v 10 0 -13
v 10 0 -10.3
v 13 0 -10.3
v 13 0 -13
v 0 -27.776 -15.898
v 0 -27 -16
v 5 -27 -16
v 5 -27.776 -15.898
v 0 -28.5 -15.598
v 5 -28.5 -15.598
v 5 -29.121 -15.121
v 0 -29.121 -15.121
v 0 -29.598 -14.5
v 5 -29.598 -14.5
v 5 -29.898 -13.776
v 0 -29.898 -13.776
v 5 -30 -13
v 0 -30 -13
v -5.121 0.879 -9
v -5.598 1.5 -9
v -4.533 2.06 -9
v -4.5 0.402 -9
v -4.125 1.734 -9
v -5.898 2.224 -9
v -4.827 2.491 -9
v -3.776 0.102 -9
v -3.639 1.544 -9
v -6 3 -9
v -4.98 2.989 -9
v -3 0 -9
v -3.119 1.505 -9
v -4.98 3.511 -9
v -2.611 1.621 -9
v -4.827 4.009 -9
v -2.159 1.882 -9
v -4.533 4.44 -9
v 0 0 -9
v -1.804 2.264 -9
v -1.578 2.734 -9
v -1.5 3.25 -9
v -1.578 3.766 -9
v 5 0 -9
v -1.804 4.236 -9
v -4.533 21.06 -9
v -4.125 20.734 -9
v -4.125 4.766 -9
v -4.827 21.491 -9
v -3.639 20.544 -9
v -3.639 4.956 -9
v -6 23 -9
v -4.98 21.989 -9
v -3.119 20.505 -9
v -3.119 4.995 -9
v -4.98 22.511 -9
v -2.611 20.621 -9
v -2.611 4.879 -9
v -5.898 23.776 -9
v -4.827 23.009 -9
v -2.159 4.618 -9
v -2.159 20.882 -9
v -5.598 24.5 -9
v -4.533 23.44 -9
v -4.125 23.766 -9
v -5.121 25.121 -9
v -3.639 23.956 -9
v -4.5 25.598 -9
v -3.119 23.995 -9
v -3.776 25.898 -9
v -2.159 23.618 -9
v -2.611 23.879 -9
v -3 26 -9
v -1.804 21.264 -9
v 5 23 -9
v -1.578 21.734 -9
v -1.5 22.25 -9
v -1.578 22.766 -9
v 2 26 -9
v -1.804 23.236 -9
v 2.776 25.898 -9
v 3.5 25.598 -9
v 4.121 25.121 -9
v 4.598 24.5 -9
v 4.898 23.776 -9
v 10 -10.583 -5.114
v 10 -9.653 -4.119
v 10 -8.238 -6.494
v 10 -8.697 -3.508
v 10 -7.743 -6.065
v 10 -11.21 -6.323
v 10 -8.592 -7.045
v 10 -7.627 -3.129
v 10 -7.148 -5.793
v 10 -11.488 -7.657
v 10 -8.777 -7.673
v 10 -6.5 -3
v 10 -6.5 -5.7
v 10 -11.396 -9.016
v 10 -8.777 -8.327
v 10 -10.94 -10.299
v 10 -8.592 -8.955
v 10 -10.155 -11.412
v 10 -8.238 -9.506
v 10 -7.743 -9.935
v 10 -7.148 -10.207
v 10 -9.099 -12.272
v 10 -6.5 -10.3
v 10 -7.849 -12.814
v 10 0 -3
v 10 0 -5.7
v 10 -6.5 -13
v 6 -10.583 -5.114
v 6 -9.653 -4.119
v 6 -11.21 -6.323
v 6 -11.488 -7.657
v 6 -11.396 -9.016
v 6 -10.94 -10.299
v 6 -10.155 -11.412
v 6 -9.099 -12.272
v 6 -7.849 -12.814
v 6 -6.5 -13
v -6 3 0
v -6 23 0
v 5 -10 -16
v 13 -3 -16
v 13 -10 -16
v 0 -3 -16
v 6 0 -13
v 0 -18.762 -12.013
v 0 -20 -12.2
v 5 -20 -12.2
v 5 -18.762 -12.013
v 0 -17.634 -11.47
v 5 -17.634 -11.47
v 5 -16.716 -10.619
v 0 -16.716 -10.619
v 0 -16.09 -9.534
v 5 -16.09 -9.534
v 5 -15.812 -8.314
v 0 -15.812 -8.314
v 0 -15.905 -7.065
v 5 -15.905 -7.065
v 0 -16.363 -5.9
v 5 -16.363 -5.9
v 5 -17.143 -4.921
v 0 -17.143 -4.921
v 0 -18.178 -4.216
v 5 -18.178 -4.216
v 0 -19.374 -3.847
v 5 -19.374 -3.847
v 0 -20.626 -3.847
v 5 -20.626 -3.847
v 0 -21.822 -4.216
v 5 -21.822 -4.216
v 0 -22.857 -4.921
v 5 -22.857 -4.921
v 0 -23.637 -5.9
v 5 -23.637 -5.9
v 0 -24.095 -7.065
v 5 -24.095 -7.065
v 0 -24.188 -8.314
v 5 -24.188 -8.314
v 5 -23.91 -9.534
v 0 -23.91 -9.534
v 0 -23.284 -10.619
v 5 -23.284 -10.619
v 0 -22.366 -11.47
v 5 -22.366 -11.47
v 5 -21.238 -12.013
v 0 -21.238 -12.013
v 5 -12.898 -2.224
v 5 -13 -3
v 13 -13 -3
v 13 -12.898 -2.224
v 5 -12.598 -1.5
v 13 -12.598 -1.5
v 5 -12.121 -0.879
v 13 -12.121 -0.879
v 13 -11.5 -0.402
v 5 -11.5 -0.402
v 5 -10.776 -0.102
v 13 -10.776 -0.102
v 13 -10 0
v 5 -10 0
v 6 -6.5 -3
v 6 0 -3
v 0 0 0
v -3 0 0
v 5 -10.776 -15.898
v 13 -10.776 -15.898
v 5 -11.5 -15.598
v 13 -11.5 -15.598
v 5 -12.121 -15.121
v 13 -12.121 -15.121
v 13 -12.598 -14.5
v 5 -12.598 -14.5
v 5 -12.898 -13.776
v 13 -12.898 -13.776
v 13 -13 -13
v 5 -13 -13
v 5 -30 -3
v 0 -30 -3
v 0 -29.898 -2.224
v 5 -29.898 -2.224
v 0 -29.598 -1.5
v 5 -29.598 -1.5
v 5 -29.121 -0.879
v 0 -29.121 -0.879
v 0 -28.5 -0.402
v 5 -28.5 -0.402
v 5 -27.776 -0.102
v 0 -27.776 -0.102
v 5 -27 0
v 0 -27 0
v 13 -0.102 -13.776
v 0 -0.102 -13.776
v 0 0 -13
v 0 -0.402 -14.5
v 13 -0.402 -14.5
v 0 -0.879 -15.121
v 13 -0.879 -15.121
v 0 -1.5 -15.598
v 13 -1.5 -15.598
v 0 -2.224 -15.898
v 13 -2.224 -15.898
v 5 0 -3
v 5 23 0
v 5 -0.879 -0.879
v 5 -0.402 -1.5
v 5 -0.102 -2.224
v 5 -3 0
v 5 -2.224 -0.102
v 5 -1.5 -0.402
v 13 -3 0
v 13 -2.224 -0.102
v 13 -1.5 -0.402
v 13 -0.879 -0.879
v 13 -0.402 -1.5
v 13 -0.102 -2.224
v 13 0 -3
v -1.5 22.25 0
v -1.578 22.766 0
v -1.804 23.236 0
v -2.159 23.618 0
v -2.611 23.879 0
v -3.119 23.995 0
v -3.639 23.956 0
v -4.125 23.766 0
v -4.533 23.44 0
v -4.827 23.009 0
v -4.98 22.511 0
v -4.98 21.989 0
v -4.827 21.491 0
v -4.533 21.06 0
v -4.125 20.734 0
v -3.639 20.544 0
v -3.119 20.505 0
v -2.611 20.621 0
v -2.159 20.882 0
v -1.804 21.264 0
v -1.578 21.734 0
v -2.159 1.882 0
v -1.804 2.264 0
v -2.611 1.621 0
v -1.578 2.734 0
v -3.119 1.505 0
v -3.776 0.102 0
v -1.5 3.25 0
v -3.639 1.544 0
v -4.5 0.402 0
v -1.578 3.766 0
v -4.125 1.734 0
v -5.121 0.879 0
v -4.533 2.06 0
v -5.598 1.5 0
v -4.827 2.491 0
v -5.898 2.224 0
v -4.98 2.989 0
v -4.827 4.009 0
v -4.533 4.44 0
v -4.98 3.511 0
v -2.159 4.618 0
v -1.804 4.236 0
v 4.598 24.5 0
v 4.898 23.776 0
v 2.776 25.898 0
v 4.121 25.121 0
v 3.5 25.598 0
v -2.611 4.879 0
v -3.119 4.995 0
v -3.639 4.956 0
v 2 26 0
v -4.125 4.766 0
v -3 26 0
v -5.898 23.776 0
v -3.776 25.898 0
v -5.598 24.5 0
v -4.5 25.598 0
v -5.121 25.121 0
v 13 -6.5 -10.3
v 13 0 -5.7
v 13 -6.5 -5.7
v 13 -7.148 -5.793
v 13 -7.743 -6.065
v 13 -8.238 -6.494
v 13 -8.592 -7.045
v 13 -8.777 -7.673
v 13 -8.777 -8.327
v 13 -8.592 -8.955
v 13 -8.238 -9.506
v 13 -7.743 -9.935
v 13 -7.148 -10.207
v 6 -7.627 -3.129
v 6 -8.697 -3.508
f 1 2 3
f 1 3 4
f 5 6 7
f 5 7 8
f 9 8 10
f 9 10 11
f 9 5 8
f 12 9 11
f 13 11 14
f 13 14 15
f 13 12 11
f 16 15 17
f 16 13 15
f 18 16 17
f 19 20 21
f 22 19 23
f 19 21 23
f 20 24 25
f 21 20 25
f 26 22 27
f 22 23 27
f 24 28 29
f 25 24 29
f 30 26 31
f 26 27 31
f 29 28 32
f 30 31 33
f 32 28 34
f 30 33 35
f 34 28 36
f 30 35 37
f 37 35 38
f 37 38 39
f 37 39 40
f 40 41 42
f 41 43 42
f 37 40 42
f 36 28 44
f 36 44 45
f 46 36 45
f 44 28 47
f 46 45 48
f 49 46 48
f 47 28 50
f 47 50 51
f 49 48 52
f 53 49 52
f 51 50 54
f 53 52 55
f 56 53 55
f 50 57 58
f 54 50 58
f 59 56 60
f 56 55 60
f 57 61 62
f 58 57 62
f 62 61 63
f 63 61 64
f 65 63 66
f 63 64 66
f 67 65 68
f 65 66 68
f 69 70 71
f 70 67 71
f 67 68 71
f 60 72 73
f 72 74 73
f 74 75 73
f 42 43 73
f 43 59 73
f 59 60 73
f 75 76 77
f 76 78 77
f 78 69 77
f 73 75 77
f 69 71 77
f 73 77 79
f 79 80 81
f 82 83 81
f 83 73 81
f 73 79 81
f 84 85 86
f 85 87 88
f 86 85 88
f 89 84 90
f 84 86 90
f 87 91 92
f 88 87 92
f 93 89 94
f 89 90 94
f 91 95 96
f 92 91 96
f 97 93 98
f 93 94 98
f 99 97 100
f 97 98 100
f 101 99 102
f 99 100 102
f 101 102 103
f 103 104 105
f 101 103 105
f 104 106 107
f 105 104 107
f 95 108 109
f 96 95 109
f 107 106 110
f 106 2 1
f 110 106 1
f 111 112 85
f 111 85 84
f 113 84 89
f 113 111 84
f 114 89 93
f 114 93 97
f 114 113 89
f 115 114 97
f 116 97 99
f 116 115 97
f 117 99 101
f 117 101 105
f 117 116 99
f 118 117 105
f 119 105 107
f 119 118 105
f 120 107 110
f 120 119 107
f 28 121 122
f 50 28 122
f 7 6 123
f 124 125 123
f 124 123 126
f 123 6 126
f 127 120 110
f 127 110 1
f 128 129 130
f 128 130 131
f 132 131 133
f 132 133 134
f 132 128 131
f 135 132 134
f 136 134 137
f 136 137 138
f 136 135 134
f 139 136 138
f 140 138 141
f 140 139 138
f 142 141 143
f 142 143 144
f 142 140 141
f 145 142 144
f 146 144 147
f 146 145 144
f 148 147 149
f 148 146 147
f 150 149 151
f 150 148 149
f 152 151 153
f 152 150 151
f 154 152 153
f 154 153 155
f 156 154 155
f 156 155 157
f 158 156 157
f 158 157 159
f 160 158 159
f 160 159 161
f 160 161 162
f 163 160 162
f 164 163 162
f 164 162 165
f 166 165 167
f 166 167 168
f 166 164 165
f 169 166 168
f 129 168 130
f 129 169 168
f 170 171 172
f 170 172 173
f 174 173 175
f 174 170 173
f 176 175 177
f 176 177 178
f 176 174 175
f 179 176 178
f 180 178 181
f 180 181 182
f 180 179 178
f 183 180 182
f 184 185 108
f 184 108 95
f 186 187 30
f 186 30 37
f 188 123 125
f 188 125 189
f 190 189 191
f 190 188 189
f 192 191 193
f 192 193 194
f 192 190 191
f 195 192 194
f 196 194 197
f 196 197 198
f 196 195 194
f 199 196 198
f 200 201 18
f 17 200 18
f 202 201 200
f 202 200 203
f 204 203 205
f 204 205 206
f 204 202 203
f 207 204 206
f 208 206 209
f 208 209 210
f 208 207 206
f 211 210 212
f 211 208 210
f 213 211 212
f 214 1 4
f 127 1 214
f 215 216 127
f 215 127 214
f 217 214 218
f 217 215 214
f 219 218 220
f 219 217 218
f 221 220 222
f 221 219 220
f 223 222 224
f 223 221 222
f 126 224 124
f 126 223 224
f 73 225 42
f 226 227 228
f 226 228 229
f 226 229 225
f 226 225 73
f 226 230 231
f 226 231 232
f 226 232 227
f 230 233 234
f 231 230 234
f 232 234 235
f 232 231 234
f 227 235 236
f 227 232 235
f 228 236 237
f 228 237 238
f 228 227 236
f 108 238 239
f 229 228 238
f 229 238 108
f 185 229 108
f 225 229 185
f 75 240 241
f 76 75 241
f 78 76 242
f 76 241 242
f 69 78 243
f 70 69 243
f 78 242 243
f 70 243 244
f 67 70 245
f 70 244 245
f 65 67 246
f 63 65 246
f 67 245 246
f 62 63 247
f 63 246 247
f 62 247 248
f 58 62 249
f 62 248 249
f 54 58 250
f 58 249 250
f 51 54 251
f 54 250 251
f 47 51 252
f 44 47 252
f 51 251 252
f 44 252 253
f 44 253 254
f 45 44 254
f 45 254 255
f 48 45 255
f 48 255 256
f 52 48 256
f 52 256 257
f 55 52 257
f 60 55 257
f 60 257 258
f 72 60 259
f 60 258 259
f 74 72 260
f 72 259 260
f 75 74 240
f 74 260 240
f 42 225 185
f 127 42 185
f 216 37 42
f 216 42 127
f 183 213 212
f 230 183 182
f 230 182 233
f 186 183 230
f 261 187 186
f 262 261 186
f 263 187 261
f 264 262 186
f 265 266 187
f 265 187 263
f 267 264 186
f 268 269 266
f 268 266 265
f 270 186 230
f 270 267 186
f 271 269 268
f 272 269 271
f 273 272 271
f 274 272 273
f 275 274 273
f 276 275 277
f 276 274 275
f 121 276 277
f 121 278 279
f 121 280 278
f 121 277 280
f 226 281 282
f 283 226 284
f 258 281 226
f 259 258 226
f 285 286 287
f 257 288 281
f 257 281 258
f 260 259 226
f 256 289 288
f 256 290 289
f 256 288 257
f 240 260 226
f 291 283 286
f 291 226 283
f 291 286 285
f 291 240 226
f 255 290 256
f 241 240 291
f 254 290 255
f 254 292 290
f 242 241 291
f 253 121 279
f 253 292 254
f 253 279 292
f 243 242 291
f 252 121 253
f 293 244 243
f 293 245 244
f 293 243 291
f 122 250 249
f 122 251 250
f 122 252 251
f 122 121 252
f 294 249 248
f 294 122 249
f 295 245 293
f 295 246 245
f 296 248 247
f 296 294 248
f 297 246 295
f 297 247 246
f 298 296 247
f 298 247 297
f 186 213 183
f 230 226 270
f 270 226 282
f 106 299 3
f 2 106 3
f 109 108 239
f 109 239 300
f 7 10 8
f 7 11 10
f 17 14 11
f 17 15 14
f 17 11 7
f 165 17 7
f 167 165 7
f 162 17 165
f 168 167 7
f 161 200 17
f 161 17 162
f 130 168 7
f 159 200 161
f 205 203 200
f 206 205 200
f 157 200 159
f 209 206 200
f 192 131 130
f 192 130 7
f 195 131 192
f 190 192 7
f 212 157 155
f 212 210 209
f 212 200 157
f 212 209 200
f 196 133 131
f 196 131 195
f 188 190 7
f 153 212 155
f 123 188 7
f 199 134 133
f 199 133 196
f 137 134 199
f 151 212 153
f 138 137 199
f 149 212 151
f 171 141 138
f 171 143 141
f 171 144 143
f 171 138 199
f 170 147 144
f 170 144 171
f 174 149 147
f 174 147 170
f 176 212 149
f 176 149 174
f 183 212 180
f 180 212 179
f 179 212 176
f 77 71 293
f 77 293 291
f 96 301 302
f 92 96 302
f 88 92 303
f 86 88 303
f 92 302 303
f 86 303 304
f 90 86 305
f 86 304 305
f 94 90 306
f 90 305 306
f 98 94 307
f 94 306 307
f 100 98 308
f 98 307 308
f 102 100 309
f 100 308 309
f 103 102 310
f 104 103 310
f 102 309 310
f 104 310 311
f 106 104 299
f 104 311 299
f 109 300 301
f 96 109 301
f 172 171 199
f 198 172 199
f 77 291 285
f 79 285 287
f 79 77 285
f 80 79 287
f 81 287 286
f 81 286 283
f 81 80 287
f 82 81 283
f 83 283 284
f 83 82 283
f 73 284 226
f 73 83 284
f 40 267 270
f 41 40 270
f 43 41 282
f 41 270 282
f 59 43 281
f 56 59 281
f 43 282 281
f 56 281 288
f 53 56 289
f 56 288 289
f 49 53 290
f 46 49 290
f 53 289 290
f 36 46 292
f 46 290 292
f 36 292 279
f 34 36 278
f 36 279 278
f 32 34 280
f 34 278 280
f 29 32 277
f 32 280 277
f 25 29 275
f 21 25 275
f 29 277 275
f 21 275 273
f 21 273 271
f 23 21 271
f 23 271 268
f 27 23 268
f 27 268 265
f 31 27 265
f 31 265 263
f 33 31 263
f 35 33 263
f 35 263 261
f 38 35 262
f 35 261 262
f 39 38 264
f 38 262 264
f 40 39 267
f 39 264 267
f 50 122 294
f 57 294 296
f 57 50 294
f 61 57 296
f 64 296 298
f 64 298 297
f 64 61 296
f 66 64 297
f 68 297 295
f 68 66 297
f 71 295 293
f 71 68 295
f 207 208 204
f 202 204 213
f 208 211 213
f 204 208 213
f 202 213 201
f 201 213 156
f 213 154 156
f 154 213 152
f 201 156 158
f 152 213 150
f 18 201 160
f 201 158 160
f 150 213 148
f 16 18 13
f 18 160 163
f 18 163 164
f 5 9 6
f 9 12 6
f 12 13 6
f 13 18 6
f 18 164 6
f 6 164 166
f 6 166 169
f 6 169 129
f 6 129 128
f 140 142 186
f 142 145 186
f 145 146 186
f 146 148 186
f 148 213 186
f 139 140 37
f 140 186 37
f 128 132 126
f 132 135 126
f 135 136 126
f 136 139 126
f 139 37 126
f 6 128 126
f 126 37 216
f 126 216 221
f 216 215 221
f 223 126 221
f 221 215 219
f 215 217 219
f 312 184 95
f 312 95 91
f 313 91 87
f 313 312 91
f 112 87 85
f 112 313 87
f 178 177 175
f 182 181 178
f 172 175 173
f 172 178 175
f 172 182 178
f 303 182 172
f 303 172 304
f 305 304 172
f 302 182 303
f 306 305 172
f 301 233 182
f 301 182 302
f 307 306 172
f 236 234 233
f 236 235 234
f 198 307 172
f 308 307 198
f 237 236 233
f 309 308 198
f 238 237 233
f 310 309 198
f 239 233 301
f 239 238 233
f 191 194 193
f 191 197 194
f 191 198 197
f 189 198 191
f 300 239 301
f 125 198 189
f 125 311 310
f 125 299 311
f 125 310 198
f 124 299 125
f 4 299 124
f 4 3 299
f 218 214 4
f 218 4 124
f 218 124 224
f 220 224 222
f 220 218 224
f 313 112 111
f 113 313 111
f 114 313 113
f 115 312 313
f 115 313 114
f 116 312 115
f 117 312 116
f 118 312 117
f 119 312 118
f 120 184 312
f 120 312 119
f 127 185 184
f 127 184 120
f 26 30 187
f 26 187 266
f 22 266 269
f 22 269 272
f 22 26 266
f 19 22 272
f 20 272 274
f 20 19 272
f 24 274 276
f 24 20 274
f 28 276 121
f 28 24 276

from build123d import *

# Parameters (mm, degrees)
SKETCH1_W           = 16
SKETCH1_H           = 30
SKETCH1_R           = 4.2
BOSS_EXTRUDE1_DEPTH = 5
SKETCH2_W           = 11
SKETCH2_H           = 26
SKETCH2_R           = 1.75
BOSS_EXTRUDE2_DEPTH = 9
SKETCH3_W           = 16
SKETCH3_H           = 13
BOSS_EXTRUDE3_DEPTH = 8
CUT_EXTRUDE1_START  = 1
CUT_EXTRUDE1_DEPTH  = 4
CUT_EXTRUDE2_DEPTH  = 7
FILLET1_START       = -10
FILLET1_DEPTH       = 10
FILLET1_START_2     = 5
FILLET1_2_DEPTH     = 9
FILLET1_START_3     = -6
FILLET1_3_DEPTH     = 11


with BuildPart() as part:
    # Sketch1 → Boss-Extrude1 (new body)
    with BuildSketch(Plane(origin=(0, 0, 0), x_dir=(0, 0, -1), z_dir=(1, 0, 0))):
        with Locations((8, -15)):
            Rectangle(SKETCH1_W, SKETCH1_H)
        with Locations((8, -20)):
            Circle(SKETCH1_R, mode=Mode.SUBTRACT)
    extrude(amount=BOSS_EXTRUDE1_DEPTH)

    # Sketch2 → Boss-Extrude2 (add)
    with BuildSketch(Plane.XY):
        with Locations((-0.5, 13)):
            Rectangle(SKETCH2_W, SKETCH2_H)
        with Locations((-3.25, 22.25)):
            Circle(SKETCH2_R, mode=Mode.SUBTRACT)
        with Locations((-3.25, 3.25)):
            Circle(SKETCH2_R, mode=Mode.SUBTRACT)
    extrude(amount=-BOSS_EXTRUDE2_DEPTH)

    # Sketch3 → Boss-Extrude3 (add)
    with BuildSketch(Plane(origin=(5, 0, 0), x_dir=(0, 0, -1), z_dir=(1, 0, 0))):
        with Locations((8, -6.5)):
            Rectangle(SKETCH3_W, SKETCH3_H)
    extrude(amount=BOSS_EXTRUDE3_DEPTH)

    # Sketch5 → Cut-Extrude1 (cut)
    with BuildSketch(Plane(origin=(5, 0, 0), x_dir=(0, 0, -1), z_dir=(1, 0, 0)).offset(CUT_EXTRUDE1_START)):
        with BuildLine():
            ThreePointArc((3, -6.5), (3.288161187, -8.172894198), (4.119429999, -9.652963125))
            Line((4.119429999, -9.652963125), (11.880570001, -3.347036875))
            ThreePointArc((11.880570001, -3.347036875), (6.327105802, -1.788161187), (3, -6.5))
        make_face()
        with BuildLine():
            Line((11.880570001, -3.347036875), (4.119429999, -9.652963125))
            ThreePointArc((4.119429999, -9.652963125), (9.672894198, -11.211838813), (13, -6.5))
            ThreePointArc((13, -6.5), (12.711838813, -4.827105802), (11.880570001, -3.347036875))
        make_face()
        with BuildLine():
            ThreePointArc((3, -6.5), (6.327105802, -1.788161187), (11.880570001, -3.347036875))
            Line((11.880570001, -3.347036875), (13, -2.4375))
            Line((13, -2.4375), (13, 0))
            Line((13, 0), (9, 0))
            Line((9, 0), (3, 0))
            Line((3, 0), (3, -6.5))
        make_face()
        with BuildLine():
            Line((13, -2.4375), (11.880570001, -3.347036875))
            ThreePointArc((11.880570001, -3.347036875), (12.711838813, -4.827105802), (13, -6.5))
            Line((13, -6.5), (13, -2.4375))
        make_face()
    extrude(amount=CUT_EXTRUDE1_DEPTH, mode=Mode.SUBTRACT)

    # Sketch6 → Cut-Extrude2 (cut)
    with BuildSketch(Plane(origin=(13, 0, 0), x_dir=(0, 0, -1), z_dir=(1, 0, 0))):
        with BuildLine():
            Line((10.3, 0), (5.7, 0))
            Line((5.7, 0), (5.7, -6.5))
            ThreePointArc((5.7, -6.5), (8, -8.8), (10.3, -6.5))
            Line((10.3, -6.5), (10.3, 0))
        make_face()
    extrude(amount=-CUT_EXTRUDE2_DEPTH, mode=Mode.SUBTRACT)

    # Fillet1: read off the stored shape, not the designer's step
    # Fillet1 outline → Fillet1 (cut)
    with BuildSketch(Plane.XY.offset(FILLET1_START)):
        with BuildLine():
            Line((-6, 26), (-6, 23))
            ThreePointArc((-6, 23), (-5.121320344, 25.121320344), (-3, 26))
            Line((-3, 26), (-6, 26))
        make_face()
        with BuildLine():
            ThreePointArc((-3, 0), (-5.121320344, 0.878679656), (-6, 3))
            Line((-6, 3), (-6, 0))
            Line((-6, 0), (-3, 0))
        make_face()
        with BuildLine():
            Line((5, 26), (2, 26))
            ThreePointArc((2, 26), (4.121320344, 25.121320344), (5, 23))
            Line((5, 23), (5, 26))
        make_face()
    extrude(amount=FILLET1_DEPTH, mode=Mode.SUBTRACT)

    # Fillet1 2 outline → Fillet1 2 (cut)
    with BuildSketch(Plane.YZ.offset(FILLET1_START_2)):
        with BuildLine():
            Line((0, 0), (-3, 0))
            ThreePointArc((-3, 0), (-0.878679656, -0.878679656), (0, -3))
            Line((0, -3), (0, 0))
        make_face()
        with BuildLine():
            ThreePointArc((-13, -3), (-12.121320344, -0.878679656), (-10, 0))
            Line((-10, 0), (-13, 0))
            Line((-13, 0), (-13, -3))
        make_face()
        with BuildLine():
            Line((0, -16), (0, -13))
            ThreePointArc((0, -13), (-0.878679656, -15.121320344), (-3, -16))
            Line((-3, -16), (0, -16))
        make_face()
        with BuildLine():
            ThreePointArc((-10, -16), (-12.121320344, -15.121320344), (-13, -13))
            Line((-13, -13), (-13, -16))
            Line((-13, -16), (-10, -16))
        make_face()
    extrude(amount=FILLET1_2_DEPTH, mode=Mode.SUBTRACT)

    # Fillet1 3 outline → Fillet1 3 (cut)
    with BuildSketch(Plane.YZ.offset(FILLET1_START_3)):
        with BuildLine():
            Line((0, -16), (0, -13))
            ThreePointArc((0, -13), (-0.878679656, -15.121320344), (-3, -16))
            Line((-3, -16), (0, -16))
        make_face()
        with BuildLine():
            ThreePointArc((-30, -3), (-29.121320344, -0.878679656), (-27, 0))
            Line((-27, 0), (-30, 0))
            Line((-30, 0), (-30, -3))
        make_face()
        with BuildLine():
            Line((-30, -16), (-27, -16))
            ThreePointArc((-27, -16), (-29.121320344, -15.121320344), (-30, -13))
            Line((-30, -13), (-30, -16))
        make_face()
    extrude(amount=FILLET1_3_DEPTH, mode=Mode.SUBTRACT)


solid = part.part
